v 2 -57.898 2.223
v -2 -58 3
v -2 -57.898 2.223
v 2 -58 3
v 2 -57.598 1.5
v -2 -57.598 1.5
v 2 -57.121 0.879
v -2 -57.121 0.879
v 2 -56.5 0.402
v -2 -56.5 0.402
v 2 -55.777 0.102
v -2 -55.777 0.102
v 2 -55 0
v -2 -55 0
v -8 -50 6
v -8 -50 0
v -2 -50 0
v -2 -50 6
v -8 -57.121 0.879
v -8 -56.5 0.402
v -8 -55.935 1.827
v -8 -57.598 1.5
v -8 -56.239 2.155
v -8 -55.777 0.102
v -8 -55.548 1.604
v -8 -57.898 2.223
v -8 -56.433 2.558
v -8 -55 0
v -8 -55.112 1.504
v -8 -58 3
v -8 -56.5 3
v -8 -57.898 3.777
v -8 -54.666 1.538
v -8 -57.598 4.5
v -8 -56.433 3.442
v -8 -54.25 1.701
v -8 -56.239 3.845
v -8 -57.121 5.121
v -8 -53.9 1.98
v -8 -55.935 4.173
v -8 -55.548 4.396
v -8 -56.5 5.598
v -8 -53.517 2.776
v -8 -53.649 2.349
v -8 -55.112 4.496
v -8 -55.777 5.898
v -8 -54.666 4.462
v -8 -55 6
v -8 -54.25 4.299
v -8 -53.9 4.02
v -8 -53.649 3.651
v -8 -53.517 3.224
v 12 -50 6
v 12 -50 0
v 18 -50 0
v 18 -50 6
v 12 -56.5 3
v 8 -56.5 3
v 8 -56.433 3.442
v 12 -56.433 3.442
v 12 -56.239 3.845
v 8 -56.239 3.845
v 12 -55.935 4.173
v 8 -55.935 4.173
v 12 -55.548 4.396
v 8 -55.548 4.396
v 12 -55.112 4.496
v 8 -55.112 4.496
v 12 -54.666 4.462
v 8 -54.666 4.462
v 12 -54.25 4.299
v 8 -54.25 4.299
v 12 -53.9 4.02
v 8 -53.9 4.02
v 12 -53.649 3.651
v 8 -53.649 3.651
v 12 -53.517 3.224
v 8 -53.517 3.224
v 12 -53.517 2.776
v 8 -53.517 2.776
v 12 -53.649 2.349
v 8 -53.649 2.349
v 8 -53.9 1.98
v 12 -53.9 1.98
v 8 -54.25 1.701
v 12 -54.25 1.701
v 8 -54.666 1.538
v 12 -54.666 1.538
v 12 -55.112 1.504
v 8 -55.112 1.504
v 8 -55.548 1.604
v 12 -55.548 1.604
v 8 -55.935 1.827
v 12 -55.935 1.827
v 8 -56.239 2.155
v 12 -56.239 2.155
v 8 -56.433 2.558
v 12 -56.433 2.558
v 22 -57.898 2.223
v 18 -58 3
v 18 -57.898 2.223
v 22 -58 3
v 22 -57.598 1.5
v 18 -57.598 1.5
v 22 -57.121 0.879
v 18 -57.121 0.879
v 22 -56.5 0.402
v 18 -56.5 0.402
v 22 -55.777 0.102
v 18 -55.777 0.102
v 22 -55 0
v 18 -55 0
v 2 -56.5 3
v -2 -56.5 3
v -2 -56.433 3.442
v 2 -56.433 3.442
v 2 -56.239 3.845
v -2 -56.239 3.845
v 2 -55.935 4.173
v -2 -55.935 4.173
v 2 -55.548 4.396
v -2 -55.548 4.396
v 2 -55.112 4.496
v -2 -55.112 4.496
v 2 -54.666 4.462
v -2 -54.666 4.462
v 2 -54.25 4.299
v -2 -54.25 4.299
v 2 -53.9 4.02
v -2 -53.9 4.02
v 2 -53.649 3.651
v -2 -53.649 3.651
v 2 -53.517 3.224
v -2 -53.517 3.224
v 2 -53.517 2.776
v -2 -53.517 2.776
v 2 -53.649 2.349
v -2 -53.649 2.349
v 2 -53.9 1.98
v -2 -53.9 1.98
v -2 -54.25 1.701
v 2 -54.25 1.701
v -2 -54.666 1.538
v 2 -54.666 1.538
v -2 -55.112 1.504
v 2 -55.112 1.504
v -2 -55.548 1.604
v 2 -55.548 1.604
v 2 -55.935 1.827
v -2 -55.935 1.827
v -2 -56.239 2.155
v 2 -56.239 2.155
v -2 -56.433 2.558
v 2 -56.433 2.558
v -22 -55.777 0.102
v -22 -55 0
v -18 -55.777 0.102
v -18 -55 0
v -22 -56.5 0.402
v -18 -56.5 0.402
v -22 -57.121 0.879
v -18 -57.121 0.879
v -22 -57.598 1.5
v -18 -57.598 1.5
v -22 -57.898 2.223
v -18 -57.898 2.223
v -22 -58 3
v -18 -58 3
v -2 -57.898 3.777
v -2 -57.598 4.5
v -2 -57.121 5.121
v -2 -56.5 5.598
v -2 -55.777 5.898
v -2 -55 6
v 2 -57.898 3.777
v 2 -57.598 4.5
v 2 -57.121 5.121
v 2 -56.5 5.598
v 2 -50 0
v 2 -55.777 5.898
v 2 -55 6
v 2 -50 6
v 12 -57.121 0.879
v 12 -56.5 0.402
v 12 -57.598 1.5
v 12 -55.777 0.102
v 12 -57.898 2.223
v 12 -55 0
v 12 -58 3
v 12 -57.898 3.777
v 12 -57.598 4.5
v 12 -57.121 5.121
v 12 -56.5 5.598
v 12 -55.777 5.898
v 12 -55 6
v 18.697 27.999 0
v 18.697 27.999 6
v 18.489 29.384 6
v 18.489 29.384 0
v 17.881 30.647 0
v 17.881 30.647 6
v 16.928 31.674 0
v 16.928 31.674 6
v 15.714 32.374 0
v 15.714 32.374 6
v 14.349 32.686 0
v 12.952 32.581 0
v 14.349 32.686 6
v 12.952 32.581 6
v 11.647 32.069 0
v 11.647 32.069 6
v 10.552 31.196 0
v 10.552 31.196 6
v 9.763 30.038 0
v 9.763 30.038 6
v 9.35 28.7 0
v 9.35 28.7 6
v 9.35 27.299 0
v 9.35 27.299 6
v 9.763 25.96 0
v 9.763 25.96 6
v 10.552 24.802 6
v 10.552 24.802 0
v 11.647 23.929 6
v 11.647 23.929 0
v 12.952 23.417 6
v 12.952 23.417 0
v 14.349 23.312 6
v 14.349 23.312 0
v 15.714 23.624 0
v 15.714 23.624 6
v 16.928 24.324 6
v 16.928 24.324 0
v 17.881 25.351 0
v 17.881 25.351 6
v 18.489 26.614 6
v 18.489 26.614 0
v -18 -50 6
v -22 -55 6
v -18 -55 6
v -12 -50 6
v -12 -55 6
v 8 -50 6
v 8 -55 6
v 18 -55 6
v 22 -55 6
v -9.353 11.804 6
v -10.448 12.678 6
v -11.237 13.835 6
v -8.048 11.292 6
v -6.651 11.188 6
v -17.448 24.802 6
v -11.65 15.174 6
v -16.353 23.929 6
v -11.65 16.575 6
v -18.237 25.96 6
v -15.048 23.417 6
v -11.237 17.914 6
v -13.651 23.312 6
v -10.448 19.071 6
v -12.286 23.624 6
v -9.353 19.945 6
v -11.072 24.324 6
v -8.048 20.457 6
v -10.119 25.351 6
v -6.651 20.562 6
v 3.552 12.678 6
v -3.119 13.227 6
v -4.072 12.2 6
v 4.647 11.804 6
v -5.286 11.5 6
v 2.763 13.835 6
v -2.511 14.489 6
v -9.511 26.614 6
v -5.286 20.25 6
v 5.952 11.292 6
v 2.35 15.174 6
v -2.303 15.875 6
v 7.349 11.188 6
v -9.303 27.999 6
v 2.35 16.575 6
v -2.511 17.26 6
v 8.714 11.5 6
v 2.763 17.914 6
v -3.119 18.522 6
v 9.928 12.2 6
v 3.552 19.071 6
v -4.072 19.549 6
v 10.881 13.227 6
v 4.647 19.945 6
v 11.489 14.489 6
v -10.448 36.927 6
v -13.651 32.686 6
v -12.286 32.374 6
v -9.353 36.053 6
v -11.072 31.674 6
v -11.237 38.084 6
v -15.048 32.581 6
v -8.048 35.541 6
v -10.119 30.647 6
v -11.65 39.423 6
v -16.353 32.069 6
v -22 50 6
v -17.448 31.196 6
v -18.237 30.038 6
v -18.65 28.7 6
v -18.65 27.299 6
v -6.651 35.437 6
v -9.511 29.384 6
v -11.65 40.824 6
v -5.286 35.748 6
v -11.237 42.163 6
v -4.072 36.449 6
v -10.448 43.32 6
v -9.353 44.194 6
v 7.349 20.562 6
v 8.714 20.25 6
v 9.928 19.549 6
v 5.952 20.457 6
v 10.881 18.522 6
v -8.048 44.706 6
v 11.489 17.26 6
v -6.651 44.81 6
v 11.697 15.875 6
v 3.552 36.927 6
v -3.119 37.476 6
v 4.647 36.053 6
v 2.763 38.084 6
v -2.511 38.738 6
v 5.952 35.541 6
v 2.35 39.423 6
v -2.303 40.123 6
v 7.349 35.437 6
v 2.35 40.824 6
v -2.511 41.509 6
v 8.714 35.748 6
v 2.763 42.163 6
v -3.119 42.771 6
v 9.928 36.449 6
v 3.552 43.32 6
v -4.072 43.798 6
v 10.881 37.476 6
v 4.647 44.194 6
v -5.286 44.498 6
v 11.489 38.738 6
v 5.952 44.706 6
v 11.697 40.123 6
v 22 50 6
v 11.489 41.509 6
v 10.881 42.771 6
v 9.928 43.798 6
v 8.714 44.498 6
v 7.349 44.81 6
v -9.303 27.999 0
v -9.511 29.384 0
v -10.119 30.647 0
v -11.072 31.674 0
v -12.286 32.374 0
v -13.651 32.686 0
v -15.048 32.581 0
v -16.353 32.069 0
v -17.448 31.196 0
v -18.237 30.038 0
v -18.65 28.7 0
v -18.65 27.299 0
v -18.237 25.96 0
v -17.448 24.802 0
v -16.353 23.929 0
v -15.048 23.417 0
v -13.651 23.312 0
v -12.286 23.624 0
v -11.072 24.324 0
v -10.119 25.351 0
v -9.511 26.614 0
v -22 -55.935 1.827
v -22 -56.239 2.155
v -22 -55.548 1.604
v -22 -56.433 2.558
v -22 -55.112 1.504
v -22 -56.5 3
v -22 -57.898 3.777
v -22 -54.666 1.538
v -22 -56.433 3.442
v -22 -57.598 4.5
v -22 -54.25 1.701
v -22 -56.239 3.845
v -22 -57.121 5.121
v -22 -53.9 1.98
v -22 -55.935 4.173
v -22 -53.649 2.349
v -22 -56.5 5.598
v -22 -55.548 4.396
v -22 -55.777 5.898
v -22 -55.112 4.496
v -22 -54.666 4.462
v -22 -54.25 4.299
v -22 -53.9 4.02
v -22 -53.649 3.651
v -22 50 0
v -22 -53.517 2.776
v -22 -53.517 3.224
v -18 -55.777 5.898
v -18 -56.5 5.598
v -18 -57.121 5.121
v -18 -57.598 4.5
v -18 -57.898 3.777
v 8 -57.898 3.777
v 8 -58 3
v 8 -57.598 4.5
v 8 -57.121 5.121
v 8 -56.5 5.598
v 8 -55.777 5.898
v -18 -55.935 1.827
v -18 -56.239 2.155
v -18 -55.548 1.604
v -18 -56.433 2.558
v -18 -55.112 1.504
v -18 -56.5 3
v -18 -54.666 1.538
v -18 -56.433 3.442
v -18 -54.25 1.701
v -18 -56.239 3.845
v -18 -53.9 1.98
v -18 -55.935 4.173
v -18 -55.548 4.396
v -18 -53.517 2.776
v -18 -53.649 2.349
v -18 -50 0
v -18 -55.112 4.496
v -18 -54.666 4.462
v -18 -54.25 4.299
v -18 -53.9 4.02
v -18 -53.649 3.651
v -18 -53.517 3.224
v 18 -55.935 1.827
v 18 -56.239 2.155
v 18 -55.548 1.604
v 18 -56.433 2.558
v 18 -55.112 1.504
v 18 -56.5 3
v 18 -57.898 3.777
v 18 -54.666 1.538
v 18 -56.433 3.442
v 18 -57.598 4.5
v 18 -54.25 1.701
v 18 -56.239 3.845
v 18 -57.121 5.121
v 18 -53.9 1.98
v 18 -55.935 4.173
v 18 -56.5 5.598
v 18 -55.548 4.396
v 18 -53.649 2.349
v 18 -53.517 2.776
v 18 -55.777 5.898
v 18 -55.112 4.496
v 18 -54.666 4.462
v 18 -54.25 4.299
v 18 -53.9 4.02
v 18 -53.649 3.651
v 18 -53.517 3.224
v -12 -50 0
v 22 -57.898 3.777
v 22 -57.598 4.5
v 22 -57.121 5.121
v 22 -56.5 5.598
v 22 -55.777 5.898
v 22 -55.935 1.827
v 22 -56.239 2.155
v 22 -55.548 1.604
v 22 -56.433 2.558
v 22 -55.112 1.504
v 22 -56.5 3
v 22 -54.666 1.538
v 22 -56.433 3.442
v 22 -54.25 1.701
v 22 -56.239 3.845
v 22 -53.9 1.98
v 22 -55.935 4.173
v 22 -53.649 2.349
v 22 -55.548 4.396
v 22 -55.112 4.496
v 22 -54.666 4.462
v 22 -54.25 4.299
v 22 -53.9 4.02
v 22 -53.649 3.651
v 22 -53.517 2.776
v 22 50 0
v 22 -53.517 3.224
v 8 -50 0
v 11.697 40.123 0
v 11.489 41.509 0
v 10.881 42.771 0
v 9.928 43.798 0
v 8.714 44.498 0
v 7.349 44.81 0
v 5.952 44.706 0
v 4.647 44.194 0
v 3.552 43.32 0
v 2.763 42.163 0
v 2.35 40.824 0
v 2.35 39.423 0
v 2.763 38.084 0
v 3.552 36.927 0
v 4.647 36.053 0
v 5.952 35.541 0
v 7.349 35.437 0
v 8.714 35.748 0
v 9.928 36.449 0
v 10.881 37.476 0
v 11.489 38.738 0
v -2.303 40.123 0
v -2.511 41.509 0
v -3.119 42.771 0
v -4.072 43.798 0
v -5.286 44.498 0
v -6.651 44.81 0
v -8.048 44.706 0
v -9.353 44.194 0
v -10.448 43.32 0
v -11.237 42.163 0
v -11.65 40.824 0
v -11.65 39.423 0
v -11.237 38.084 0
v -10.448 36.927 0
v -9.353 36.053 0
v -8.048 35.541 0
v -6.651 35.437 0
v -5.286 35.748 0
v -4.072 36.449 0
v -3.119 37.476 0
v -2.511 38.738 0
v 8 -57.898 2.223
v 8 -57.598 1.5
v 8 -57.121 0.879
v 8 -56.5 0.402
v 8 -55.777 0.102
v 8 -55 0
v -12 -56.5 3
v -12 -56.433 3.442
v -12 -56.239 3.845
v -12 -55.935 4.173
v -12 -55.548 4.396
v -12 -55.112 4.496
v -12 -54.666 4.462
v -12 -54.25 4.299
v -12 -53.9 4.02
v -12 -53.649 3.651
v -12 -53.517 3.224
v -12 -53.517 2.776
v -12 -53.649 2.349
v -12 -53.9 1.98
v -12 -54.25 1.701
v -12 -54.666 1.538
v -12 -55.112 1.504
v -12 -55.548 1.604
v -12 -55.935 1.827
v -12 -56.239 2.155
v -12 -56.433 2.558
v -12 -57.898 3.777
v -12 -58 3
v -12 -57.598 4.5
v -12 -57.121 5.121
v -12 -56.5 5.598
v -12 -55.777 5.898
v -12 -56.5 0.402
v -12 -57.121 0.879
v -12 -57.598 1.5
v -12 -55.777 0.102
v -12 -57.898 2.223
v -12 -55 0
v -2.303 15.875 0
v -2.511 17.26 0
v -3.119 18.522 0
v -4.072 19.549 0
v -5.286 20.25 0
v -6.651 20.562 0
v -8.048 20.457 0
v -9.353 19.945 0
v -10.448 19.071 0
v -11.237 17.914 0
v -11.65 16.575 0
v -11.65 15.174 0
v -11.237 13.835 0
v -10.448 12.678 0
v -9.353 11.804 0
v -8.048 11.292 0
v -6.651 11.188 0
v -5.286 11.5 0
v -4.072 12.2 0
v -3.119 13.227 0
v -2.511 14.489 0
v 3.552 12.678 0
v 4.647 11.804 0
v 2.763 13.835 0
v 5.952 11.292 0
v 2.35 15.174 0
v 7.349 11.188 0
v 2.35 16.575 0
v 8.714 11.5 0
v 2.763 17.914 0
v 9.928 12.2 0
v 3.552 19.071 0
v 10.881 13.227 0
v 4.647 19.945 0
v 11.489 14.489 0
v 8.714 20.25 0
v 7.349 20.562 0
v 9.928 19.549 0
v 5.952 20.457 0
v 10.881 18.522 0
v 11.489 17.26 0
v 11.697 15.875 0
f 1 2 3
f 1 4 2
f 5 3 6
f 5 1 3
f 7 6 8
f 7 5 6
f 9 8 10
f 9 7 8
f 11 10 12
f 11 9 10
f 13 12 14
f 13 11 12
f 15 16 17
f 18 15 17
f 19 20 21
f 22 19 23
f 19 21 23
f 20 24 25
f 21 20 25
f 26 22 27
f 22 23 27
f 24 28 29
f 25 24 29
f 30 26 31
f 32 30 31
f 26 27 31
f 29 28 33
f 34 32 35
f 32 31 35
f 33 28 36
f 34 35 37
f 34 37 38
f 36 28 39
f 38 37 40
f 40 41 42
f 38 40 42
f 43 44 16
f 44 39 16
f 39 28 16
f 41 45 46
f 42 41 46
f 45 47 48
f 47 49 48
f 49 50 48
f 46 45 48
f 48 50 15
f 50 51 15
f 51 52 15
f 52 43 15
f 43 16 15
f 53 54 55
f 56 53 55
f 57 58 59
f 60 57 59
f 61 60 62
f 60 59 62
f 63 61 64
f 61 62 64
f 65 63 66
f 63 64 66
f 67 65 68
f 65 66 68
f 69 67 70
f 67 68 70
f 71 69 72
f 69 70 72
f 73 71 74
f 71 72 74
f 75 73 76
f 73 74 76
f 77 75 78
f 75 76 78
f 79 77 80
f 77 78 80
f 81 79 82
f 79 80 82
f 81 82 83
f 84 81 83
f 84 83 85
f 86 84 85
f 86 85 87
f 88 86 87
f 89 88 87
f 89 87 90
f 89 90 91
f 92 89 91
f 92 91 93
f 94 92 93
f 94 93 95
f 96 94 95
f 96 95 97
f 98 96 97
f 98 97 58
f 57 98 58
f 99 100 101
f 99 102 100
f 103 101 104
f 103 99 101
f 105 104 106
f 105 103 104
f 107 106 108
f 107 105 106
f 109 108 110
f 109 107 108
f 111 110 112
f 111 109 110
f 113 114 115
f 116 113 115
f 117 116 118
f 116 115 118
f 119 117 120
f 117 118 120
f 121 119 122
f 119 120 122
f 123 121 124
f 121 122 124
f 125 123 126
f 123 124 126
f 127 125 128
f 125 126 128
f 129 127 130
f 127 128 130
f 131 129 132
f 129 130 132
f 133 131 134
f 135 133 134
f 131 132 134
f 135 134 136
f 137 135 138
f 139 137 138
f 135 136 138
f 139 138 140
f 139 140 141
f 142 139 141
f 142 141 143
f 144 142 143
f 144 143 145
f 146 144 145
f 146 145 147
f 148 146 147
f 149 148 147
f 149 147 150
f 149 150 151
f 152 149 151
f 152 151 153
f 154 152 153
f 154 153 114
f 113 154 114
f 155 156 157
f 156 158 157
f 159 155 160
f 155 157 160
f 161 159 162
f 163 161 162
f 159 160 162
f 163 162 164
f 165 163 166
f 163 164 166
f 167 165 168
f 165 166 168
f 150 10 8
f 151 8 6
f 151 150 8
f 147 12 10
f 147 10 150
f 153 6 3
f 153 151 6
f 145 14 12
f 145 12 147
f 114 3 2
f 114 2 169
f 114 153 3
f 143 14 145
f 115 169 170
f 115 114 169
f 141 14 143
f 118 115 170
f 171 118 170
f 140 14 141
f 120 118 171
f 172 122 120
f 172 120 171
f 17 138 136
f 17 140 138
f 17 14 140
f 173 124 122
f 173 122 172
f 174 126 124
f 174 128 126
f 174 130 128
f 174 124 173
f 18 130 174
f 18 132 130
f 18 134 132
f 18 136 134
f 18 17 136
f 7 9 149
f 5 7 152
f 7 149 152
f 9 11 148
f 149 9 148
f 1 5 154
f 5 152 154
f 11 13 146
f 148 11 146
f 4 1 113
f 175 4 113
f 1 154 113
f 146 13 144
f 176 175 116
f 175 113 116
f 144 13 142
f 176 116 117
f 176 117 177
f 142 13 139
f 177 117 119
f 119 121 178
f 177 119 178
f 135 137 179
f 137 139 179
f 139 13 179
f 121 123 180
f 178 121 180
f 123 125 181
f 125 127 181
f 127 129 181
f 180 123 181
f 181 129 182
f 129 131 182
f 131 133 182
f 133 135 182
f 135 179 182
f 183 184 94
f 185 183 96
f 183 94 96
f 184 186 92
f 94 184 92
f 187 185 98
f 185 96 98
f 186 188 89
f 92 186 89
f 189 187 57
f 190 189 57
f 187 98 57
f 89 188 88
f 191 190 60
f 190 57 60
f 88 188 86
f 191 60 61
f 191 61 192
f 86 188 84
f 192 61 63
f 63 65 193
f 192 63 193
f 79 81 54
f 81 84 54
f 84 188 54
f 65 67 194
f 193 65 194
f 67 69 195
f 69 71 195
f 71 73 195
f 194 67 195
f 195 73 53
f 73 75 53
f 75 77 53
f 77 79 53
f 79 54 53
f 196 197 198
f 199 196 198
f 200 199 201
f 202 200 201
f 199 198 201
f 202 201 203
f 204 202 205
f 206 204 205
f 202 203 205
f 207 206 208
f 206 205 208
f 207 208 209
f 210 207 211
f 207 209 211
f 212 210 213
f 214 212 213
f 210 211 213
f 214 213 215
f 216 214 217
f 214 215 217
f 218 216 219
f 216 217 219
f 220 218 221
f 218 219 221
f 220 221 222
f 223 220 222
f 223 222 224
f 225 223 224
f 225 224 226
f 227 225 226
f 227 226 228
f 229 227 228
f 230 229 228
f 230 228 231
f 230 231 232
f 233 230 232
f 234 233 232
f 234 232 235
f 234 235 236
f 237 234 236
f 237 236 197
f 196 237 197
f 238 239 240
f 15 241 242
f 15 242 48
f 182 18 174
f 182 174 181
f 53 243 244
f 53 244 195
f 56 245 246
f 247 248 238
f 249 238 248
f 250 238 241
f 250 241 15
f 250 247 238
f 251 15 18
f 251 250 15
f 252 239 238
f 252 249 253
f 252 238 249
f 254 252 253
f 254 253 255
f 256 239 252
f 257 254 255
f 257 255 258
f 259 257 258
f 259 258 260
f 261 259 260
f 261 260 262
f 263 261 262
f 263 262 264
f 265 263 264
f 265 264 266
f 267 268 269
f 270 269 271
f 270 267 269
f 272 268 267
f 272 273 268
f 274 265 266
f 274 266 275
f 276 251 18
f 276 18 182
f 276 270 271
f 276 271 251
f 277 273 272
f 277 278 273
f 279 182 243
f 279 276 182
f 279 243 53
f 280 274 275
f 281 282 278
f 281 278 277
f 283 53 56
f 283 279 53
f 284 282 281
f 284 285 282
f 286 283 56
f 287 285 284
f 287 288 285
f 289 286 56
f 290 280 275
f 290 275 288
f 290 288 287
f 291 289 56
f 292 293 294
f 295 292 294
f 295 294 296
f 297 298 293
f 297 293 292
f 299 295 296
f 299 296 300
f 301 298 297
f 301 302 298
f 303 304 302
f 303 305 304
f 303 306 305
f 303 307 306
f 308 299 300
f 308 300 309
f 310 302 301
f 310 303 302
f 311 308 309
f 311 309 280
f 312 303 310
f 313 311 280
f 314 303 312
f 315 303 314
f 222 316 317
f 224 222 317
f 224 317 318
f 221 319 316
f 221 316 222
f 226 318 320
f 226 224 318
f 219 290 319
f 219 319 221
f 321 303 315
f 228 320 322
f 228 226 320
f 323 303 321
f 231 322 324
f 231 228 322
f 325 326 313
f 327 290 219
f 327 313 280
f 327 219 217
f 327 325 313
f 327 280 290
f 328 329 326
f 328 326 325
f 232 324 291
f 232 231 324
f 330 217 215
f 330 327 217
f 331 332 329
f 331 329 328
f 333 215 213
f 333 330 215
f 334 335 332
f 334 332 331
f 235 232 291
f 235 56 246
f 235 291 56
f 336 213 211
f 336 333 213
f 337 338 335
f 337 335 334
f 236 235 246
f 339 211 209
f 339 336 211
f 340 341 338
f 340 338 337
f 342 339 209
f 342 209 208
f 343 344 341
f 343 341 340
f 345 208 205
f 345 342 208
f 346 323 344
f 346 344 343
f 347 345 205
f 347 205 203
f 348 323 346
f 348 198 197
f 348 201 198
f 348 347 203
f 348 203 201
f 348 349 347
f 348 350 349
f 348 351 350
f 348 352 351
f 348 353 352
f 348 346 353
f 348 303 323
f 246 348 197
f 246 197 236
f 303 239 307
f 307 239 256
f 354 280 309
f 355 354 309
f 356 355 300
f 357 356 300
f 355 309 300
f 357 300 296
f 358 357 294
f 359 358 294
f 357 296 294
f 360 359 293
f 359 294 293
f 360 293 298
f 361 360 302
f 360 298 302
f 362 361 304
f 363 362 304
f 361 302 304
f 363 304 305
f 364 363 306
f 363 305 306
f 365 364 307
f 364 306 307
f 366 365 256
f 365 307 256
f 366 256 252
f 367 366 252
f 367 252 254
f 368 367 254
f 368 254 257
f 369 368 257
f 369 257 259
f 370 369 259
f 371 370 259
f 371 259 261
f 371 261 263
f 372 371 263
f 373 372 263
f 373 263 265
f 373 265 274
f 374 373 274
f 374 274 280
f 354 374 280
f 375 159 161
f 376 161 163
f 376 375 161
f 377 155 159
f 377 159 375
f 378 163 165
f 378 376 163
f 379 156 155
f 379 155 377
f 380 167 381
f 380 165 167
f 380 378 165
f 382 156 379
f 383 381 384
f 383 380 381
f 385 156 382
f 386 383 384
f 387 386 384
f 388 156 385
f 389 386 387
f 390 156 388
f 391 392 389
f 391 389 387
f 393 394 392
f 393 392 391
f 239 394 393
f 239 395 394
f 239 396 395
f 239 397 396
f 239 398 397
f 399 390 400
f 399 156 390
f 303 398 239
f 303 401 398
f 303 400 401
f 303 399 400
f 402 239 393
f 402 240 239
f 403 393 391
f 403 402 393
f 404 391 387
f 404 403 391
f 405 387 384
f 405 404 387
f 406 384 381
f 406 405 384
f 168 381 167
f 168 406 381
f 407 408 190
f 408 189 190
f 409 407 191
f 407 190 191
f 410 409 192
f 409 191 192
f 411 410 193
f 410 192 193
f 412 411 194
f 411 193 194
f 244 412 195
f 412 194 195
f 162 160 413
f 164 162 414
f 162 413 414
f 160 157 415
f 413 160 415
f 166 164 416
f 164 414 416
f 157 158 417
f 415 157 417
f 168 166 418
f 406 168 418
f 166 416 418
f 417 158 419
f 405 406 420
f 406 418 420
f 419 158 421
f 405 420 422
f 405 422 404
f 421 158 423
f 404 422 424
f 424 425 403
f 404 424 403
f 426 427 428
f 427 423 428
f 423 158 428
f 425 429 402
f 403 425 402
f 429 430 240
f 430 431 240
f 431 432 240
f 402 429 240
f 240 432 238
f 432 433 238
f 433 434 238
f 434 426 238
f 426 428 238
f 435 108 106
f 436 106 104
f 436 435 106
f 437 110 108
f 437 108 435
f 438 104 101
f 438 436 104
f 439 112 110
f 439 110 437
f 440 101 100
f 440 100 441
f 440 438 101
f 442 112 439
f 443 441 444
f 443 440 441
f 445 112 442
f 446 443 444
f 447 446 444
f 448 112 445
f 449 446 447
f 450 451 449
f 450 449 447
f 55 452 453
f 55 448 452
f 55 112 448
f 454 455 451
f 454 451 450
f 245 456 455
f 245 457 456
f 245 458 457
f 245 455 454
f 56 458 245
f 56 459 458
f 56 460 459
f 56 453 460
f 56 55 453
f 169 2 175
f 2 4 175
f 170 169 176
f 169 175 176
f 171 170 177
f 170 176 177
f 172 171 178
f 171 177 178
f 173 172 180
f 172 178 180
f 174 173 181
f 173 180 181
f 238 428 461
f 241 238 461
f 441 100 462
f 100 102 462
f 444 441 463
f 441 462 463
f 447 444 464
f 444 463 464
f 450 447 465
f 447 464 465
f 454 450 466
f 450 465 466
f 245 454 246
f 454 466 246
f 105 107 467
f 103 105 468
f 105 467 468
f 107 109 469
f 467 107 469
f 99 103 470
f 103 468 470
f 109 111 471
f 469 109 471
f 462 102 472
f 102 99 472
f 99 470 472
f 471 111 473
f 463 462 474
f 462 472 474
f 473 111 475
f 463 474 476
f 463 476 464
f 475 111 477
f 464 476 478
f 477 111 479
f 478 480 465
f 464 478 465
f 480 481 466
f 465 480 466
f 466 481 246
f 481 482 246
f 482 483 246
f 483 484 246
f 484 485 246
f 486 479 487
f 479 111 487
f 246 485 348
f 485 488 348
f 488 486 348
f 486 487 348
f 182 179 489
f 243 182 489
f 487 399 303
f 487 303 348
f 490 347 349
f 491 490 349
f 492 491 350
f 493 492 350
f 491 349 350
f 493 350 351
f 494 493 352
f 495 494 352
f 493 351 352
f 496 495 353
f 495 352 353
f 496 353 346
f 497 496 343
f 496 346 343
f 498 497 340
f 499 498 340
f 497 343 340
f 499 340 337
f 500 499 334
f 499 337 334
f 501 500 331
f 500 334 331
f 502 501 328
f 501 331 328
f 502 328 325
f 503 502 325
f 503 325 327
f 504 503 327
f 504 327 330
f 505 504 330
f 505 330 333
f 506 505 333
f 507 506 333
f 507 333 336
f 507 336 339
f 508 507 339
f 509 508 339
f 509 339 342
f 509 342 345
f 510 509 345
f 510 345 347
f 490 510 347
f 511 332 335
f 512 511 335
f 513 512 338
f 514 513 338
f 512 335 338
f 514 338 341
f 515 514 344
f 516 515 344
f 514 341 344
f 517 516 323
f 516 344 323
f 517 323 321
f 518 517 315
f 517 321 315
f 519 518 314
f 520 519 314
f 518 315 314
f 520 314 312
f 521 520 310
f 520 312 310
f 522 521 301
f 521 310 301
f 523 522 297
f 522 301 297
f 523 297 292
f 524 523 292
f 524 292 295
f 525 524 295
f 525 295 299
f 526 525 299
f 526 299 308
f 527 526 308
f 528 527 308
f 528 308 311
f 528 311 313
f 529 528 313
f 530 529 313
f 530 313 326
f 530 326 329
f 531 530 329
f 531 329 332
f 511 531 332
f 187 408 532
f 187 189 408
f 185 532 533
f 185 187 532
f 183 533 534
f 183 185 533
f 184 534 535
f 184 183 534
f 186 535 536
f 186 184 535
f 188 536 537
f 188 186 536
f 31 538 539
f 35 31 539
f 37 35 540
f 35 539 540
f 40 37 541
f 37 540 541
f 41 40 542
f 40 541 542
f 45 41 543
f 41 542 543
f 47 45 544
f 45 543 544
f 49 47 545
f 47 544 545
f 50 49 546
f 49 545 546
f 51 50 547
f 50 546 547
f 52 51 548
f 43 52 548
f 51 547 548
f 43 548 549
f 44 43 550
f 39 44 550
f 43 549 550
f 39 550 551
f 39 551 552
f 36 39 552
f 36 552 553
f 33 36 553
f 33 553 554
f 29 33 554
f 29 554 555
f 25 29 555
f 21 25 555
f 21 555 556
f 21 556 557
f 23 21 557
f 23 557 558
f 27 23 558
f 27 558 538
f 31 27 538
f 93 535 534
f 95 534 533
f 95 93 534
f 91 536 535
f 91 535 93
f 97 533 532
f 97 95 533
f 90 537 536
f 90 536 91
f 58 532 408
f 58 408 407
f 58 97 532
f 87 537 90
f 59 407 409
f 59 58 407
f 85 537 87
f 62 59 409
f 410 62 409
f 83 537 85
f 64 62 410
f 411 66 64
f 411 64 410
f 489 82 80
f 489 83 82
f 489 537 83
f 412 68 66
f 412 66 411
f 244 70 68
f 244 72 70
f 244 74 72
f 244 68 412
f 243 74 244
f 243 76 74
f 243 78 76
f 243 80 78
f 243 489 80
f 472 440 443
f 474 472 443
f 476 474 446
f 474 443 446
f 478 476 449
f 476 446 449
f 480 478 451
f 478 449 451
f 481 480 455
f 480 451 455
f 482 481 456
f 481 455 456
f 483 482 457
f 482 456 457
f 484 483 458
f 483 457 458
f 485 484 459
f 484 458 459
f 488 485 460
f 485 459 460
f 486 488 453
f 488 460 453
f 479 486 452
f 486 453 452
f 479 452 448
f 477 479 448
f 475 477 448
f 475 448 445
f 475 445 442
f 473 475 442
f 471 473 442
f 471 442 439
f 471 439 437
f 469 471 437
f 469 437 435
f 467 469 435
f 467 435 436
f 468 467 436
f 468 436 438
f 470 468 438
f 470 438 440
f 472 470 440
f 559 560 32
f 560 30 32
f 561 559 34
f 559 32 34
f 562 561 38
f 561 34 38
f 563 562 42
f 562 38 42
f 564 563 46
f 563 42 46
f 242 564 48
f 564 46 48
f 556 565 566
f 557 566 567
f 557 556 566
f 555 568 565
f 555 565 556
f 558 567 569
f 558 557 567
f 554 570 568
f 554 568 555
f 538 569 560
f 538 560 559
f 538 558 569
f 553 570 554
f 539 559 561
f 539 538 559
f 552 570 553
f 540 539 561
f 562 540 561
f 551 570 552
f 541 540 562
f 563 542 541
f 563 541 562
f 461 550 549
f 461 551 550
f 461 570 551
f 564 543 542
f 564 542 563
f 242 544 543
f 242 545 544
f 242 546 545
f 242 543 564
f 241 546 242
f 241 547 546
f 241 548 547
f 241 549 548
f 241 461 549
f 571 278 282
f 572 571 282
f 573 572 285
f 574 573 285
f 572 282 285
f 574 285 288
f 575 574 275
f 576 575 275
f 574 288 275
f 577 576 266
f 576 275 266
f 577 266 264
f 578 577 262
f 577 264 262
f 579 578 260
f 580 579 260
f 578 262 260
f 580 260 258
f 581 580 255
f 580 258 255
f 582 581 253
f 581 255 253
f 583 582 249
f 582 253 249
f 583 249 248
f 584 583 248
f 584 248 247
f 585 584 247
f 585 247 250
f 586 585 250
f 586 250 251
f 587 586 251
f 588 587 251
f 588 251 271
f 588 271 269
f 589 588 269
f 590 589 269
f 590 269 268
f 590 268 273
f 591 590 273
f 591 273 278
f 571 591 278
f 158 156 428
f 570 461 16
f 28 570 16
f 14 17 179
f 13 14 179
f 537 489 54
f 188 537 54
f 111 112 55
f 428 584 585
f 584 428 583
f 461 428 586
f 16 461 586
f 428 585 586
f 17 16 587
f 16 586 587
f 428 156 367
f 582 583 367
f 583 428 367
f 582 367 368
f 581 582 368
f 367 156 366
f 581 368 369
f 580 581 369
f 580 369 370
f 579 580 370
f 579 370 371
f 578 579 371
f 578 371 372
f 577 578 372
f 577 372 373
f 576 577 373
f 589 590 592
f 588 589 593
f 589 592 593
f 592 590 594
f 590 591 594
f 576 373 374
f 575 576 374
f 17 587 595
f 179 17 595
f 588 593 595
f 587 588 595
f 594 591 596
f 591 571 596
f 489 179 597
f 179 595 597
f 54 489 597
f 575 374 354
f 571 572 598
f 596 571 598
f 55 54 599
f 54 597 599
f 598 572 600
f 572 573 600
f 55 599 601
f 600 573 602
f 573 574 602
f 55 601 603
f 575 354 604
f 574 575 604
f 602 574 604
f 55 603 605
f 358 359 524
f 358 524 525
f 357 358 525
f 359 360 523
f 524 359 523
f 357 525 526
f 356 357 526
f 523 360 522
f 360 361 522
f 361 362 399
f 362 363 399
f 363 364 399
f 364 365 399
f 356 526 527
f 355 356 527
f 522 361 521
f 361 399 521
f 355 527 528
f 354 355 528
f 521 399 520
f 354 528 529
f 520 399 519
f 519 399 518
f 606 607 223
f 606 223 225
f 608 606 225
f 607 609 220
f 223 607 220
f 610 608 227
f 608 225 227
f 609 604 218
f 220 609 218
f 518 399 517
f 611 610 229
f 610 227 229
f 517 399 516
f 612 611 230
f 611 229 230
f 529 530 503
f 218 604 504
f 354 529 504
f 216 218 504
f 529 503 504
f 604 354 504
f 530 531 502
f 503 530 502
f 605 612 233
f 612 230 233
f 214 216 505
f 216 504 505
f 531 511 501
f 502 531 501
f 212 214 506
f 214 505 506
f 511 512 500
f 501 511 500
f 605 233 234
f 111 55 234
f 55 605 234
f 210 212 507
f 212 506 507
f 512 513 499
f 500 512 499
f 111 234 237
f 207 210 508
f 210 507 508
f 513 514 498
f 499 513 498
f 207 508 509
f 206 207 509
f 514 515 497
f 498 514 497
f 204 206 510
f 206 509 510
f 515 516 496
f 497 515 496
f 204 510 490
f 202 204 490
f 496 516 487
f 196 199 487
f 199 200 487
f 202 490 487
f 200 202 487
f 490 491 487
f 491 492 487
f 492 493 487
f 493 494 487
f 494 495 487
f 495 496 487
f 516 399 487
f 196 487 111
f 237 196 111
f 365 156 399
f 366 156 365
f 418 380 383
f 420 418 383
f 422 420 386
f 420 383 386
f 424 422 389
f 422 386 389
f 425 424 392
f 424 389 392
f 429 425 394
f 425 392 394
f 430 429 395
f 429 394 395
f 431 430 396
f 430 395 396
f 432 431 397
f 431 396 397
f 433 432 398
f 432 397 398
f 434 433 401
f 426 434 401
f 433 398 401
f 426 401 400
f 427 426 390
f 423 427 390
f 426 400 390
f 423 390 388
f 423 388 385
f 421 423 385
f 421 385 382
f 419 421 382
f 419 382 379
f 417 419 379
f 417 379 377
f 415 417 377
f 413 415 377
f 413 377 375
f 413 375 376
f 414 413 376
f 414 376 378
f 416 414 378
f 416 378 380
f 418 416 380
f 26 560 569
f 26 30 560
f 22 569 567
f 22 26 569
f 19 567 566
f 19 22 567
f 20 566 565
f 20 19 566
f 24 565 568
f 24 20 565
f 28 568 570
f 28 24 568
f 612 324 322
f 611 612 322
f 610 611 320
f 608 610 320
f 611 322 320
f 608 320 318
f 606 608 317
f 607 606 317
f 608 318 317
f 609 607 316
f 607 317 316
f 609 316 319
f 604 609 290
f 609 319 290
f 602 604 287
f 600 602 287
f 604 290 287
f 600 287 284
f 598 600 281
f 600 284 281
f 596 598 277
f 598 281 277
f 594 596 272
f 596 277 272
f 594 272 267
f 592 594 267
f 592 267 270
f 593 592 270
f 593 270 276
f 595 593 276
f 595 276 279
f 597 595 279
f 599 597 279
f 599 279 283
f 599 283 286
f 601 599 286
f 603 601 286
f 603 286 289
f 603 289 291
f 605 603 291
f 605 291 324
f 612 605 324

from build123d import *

# Parameters (mm, degrees)
SKETCH1_W              = 44
SKETCH1_H              = 100
BOSS_EXTRUDE1_DEPTH    = 6
SKETCH3_R              = 4.7
CUT_EXTRUDE4_DEPTH     = 10
SKETCH4_W              = 4
SKETCH4_H              = 6
BOSS_EXTRUDE2_DEPTH    = 8
FILLET1_R              = 3
LPATTERN1_COUNT        = 5
LPATTERN1_PITCH        = 10
FILLET1_OF_LPATTERN1_R = 3
SKETCH5_R              = 1.5
CUT_EXTRUDE5_DEPTH     = 74.047929471


with BuildPart() as part:
    # Sketch1 → Boss-Extrude1 (new body)
    with BuildSketch(Plane.XY):
        Rectangle(SKETCH1_W, SKETCH1_H)
    extrude(amount=BOSS_EXTRUDE1_DEPTH)

    # Sketch3 → Cut-Extrude4 (cut)
    with BuildSketch(Plane.XY.offset(6)):
        with Locations((-7.002612265, 40.123358619)):
            Circle(SKETCH3_R)
        with Locations((6.997387735, 40.123358619)):
            Circle(SKETCH3_R)
        with Locations((13.997387735, 27.999002966)):
            Circle(SKETCH3_R)
        with Locations((6.997387735, 15.874647313)):
            Circle(SKETCH3_R)
        with Locations((-7.002612265, 15.874647313)):
            Circle(SKETCH3_R)
        with Locations((-14.002612265, 27.999002966)):
            Circle(SKETCH3_R)
    extrude(amount=-CUT_EXTRUDE4_DEPTH, mode=Mode.SUBTRACT)

    # Sketch4 → Boss-Extrude2 (add)
    with BuildSketch(Plane.XZ.offset(50)):
        with Locations((-20, 3)):
            Rectangle(SKETCH4_W, SKETCH4_H)
    boss_extrude2 = extrude(amount=BOSS_EXTRUDE2_DEPTH)

    # Fillet1
    fillet1_edges = [part.edges().sort_by_distance(p)[0] for p in [
        (-20, -58, 6),
        (-20, -58, 0),
    ]]
    fillet(fillet1_edges, radius=FILLET1_R - 0.0001)  # a hair under: the kernel refuses the full size

    # LPattern1: Boss-Extrude2 ×5
    with Locations(*[(i * LPATTERN1_PITCH, 0, 0) for i in range(1, LPATTERN1_COUNT)]):
        add(boss_extrude2)

    # Fillet1 of LPattern1
    fillet1_of_lpattern1_edges = [part.edges().sort_by_distance(p)[0] for p in [
        (-10, -58, 6),
        (-10, -58, 0),
        (0, -58, 6),
        (0, -58, 0),
        (10, -58, 6),
        (10, -58, 0),
        (20, -58, 6),
        (20, -58, 0),
    ]]
    fillet(fillet1_of_lpattern1_edges, radius=FILLET1_OF_LPATTERN1_R - 0.0001)  # a hair under: the kernel refuses the full size

    # Sketch5 → Cut-Extrude5 (cut, through all)
    with BuildSketch(Plane.ZY.offset(22)):
        with Locations(Location((3, -55, 0), (0, 0, 270))):
            Circle(SKETCH5_R)
    extrude(amount=-CUT_EXTRUDE5_DEPTH, mode=Mode.SUBTRACT)


solid = part.part
